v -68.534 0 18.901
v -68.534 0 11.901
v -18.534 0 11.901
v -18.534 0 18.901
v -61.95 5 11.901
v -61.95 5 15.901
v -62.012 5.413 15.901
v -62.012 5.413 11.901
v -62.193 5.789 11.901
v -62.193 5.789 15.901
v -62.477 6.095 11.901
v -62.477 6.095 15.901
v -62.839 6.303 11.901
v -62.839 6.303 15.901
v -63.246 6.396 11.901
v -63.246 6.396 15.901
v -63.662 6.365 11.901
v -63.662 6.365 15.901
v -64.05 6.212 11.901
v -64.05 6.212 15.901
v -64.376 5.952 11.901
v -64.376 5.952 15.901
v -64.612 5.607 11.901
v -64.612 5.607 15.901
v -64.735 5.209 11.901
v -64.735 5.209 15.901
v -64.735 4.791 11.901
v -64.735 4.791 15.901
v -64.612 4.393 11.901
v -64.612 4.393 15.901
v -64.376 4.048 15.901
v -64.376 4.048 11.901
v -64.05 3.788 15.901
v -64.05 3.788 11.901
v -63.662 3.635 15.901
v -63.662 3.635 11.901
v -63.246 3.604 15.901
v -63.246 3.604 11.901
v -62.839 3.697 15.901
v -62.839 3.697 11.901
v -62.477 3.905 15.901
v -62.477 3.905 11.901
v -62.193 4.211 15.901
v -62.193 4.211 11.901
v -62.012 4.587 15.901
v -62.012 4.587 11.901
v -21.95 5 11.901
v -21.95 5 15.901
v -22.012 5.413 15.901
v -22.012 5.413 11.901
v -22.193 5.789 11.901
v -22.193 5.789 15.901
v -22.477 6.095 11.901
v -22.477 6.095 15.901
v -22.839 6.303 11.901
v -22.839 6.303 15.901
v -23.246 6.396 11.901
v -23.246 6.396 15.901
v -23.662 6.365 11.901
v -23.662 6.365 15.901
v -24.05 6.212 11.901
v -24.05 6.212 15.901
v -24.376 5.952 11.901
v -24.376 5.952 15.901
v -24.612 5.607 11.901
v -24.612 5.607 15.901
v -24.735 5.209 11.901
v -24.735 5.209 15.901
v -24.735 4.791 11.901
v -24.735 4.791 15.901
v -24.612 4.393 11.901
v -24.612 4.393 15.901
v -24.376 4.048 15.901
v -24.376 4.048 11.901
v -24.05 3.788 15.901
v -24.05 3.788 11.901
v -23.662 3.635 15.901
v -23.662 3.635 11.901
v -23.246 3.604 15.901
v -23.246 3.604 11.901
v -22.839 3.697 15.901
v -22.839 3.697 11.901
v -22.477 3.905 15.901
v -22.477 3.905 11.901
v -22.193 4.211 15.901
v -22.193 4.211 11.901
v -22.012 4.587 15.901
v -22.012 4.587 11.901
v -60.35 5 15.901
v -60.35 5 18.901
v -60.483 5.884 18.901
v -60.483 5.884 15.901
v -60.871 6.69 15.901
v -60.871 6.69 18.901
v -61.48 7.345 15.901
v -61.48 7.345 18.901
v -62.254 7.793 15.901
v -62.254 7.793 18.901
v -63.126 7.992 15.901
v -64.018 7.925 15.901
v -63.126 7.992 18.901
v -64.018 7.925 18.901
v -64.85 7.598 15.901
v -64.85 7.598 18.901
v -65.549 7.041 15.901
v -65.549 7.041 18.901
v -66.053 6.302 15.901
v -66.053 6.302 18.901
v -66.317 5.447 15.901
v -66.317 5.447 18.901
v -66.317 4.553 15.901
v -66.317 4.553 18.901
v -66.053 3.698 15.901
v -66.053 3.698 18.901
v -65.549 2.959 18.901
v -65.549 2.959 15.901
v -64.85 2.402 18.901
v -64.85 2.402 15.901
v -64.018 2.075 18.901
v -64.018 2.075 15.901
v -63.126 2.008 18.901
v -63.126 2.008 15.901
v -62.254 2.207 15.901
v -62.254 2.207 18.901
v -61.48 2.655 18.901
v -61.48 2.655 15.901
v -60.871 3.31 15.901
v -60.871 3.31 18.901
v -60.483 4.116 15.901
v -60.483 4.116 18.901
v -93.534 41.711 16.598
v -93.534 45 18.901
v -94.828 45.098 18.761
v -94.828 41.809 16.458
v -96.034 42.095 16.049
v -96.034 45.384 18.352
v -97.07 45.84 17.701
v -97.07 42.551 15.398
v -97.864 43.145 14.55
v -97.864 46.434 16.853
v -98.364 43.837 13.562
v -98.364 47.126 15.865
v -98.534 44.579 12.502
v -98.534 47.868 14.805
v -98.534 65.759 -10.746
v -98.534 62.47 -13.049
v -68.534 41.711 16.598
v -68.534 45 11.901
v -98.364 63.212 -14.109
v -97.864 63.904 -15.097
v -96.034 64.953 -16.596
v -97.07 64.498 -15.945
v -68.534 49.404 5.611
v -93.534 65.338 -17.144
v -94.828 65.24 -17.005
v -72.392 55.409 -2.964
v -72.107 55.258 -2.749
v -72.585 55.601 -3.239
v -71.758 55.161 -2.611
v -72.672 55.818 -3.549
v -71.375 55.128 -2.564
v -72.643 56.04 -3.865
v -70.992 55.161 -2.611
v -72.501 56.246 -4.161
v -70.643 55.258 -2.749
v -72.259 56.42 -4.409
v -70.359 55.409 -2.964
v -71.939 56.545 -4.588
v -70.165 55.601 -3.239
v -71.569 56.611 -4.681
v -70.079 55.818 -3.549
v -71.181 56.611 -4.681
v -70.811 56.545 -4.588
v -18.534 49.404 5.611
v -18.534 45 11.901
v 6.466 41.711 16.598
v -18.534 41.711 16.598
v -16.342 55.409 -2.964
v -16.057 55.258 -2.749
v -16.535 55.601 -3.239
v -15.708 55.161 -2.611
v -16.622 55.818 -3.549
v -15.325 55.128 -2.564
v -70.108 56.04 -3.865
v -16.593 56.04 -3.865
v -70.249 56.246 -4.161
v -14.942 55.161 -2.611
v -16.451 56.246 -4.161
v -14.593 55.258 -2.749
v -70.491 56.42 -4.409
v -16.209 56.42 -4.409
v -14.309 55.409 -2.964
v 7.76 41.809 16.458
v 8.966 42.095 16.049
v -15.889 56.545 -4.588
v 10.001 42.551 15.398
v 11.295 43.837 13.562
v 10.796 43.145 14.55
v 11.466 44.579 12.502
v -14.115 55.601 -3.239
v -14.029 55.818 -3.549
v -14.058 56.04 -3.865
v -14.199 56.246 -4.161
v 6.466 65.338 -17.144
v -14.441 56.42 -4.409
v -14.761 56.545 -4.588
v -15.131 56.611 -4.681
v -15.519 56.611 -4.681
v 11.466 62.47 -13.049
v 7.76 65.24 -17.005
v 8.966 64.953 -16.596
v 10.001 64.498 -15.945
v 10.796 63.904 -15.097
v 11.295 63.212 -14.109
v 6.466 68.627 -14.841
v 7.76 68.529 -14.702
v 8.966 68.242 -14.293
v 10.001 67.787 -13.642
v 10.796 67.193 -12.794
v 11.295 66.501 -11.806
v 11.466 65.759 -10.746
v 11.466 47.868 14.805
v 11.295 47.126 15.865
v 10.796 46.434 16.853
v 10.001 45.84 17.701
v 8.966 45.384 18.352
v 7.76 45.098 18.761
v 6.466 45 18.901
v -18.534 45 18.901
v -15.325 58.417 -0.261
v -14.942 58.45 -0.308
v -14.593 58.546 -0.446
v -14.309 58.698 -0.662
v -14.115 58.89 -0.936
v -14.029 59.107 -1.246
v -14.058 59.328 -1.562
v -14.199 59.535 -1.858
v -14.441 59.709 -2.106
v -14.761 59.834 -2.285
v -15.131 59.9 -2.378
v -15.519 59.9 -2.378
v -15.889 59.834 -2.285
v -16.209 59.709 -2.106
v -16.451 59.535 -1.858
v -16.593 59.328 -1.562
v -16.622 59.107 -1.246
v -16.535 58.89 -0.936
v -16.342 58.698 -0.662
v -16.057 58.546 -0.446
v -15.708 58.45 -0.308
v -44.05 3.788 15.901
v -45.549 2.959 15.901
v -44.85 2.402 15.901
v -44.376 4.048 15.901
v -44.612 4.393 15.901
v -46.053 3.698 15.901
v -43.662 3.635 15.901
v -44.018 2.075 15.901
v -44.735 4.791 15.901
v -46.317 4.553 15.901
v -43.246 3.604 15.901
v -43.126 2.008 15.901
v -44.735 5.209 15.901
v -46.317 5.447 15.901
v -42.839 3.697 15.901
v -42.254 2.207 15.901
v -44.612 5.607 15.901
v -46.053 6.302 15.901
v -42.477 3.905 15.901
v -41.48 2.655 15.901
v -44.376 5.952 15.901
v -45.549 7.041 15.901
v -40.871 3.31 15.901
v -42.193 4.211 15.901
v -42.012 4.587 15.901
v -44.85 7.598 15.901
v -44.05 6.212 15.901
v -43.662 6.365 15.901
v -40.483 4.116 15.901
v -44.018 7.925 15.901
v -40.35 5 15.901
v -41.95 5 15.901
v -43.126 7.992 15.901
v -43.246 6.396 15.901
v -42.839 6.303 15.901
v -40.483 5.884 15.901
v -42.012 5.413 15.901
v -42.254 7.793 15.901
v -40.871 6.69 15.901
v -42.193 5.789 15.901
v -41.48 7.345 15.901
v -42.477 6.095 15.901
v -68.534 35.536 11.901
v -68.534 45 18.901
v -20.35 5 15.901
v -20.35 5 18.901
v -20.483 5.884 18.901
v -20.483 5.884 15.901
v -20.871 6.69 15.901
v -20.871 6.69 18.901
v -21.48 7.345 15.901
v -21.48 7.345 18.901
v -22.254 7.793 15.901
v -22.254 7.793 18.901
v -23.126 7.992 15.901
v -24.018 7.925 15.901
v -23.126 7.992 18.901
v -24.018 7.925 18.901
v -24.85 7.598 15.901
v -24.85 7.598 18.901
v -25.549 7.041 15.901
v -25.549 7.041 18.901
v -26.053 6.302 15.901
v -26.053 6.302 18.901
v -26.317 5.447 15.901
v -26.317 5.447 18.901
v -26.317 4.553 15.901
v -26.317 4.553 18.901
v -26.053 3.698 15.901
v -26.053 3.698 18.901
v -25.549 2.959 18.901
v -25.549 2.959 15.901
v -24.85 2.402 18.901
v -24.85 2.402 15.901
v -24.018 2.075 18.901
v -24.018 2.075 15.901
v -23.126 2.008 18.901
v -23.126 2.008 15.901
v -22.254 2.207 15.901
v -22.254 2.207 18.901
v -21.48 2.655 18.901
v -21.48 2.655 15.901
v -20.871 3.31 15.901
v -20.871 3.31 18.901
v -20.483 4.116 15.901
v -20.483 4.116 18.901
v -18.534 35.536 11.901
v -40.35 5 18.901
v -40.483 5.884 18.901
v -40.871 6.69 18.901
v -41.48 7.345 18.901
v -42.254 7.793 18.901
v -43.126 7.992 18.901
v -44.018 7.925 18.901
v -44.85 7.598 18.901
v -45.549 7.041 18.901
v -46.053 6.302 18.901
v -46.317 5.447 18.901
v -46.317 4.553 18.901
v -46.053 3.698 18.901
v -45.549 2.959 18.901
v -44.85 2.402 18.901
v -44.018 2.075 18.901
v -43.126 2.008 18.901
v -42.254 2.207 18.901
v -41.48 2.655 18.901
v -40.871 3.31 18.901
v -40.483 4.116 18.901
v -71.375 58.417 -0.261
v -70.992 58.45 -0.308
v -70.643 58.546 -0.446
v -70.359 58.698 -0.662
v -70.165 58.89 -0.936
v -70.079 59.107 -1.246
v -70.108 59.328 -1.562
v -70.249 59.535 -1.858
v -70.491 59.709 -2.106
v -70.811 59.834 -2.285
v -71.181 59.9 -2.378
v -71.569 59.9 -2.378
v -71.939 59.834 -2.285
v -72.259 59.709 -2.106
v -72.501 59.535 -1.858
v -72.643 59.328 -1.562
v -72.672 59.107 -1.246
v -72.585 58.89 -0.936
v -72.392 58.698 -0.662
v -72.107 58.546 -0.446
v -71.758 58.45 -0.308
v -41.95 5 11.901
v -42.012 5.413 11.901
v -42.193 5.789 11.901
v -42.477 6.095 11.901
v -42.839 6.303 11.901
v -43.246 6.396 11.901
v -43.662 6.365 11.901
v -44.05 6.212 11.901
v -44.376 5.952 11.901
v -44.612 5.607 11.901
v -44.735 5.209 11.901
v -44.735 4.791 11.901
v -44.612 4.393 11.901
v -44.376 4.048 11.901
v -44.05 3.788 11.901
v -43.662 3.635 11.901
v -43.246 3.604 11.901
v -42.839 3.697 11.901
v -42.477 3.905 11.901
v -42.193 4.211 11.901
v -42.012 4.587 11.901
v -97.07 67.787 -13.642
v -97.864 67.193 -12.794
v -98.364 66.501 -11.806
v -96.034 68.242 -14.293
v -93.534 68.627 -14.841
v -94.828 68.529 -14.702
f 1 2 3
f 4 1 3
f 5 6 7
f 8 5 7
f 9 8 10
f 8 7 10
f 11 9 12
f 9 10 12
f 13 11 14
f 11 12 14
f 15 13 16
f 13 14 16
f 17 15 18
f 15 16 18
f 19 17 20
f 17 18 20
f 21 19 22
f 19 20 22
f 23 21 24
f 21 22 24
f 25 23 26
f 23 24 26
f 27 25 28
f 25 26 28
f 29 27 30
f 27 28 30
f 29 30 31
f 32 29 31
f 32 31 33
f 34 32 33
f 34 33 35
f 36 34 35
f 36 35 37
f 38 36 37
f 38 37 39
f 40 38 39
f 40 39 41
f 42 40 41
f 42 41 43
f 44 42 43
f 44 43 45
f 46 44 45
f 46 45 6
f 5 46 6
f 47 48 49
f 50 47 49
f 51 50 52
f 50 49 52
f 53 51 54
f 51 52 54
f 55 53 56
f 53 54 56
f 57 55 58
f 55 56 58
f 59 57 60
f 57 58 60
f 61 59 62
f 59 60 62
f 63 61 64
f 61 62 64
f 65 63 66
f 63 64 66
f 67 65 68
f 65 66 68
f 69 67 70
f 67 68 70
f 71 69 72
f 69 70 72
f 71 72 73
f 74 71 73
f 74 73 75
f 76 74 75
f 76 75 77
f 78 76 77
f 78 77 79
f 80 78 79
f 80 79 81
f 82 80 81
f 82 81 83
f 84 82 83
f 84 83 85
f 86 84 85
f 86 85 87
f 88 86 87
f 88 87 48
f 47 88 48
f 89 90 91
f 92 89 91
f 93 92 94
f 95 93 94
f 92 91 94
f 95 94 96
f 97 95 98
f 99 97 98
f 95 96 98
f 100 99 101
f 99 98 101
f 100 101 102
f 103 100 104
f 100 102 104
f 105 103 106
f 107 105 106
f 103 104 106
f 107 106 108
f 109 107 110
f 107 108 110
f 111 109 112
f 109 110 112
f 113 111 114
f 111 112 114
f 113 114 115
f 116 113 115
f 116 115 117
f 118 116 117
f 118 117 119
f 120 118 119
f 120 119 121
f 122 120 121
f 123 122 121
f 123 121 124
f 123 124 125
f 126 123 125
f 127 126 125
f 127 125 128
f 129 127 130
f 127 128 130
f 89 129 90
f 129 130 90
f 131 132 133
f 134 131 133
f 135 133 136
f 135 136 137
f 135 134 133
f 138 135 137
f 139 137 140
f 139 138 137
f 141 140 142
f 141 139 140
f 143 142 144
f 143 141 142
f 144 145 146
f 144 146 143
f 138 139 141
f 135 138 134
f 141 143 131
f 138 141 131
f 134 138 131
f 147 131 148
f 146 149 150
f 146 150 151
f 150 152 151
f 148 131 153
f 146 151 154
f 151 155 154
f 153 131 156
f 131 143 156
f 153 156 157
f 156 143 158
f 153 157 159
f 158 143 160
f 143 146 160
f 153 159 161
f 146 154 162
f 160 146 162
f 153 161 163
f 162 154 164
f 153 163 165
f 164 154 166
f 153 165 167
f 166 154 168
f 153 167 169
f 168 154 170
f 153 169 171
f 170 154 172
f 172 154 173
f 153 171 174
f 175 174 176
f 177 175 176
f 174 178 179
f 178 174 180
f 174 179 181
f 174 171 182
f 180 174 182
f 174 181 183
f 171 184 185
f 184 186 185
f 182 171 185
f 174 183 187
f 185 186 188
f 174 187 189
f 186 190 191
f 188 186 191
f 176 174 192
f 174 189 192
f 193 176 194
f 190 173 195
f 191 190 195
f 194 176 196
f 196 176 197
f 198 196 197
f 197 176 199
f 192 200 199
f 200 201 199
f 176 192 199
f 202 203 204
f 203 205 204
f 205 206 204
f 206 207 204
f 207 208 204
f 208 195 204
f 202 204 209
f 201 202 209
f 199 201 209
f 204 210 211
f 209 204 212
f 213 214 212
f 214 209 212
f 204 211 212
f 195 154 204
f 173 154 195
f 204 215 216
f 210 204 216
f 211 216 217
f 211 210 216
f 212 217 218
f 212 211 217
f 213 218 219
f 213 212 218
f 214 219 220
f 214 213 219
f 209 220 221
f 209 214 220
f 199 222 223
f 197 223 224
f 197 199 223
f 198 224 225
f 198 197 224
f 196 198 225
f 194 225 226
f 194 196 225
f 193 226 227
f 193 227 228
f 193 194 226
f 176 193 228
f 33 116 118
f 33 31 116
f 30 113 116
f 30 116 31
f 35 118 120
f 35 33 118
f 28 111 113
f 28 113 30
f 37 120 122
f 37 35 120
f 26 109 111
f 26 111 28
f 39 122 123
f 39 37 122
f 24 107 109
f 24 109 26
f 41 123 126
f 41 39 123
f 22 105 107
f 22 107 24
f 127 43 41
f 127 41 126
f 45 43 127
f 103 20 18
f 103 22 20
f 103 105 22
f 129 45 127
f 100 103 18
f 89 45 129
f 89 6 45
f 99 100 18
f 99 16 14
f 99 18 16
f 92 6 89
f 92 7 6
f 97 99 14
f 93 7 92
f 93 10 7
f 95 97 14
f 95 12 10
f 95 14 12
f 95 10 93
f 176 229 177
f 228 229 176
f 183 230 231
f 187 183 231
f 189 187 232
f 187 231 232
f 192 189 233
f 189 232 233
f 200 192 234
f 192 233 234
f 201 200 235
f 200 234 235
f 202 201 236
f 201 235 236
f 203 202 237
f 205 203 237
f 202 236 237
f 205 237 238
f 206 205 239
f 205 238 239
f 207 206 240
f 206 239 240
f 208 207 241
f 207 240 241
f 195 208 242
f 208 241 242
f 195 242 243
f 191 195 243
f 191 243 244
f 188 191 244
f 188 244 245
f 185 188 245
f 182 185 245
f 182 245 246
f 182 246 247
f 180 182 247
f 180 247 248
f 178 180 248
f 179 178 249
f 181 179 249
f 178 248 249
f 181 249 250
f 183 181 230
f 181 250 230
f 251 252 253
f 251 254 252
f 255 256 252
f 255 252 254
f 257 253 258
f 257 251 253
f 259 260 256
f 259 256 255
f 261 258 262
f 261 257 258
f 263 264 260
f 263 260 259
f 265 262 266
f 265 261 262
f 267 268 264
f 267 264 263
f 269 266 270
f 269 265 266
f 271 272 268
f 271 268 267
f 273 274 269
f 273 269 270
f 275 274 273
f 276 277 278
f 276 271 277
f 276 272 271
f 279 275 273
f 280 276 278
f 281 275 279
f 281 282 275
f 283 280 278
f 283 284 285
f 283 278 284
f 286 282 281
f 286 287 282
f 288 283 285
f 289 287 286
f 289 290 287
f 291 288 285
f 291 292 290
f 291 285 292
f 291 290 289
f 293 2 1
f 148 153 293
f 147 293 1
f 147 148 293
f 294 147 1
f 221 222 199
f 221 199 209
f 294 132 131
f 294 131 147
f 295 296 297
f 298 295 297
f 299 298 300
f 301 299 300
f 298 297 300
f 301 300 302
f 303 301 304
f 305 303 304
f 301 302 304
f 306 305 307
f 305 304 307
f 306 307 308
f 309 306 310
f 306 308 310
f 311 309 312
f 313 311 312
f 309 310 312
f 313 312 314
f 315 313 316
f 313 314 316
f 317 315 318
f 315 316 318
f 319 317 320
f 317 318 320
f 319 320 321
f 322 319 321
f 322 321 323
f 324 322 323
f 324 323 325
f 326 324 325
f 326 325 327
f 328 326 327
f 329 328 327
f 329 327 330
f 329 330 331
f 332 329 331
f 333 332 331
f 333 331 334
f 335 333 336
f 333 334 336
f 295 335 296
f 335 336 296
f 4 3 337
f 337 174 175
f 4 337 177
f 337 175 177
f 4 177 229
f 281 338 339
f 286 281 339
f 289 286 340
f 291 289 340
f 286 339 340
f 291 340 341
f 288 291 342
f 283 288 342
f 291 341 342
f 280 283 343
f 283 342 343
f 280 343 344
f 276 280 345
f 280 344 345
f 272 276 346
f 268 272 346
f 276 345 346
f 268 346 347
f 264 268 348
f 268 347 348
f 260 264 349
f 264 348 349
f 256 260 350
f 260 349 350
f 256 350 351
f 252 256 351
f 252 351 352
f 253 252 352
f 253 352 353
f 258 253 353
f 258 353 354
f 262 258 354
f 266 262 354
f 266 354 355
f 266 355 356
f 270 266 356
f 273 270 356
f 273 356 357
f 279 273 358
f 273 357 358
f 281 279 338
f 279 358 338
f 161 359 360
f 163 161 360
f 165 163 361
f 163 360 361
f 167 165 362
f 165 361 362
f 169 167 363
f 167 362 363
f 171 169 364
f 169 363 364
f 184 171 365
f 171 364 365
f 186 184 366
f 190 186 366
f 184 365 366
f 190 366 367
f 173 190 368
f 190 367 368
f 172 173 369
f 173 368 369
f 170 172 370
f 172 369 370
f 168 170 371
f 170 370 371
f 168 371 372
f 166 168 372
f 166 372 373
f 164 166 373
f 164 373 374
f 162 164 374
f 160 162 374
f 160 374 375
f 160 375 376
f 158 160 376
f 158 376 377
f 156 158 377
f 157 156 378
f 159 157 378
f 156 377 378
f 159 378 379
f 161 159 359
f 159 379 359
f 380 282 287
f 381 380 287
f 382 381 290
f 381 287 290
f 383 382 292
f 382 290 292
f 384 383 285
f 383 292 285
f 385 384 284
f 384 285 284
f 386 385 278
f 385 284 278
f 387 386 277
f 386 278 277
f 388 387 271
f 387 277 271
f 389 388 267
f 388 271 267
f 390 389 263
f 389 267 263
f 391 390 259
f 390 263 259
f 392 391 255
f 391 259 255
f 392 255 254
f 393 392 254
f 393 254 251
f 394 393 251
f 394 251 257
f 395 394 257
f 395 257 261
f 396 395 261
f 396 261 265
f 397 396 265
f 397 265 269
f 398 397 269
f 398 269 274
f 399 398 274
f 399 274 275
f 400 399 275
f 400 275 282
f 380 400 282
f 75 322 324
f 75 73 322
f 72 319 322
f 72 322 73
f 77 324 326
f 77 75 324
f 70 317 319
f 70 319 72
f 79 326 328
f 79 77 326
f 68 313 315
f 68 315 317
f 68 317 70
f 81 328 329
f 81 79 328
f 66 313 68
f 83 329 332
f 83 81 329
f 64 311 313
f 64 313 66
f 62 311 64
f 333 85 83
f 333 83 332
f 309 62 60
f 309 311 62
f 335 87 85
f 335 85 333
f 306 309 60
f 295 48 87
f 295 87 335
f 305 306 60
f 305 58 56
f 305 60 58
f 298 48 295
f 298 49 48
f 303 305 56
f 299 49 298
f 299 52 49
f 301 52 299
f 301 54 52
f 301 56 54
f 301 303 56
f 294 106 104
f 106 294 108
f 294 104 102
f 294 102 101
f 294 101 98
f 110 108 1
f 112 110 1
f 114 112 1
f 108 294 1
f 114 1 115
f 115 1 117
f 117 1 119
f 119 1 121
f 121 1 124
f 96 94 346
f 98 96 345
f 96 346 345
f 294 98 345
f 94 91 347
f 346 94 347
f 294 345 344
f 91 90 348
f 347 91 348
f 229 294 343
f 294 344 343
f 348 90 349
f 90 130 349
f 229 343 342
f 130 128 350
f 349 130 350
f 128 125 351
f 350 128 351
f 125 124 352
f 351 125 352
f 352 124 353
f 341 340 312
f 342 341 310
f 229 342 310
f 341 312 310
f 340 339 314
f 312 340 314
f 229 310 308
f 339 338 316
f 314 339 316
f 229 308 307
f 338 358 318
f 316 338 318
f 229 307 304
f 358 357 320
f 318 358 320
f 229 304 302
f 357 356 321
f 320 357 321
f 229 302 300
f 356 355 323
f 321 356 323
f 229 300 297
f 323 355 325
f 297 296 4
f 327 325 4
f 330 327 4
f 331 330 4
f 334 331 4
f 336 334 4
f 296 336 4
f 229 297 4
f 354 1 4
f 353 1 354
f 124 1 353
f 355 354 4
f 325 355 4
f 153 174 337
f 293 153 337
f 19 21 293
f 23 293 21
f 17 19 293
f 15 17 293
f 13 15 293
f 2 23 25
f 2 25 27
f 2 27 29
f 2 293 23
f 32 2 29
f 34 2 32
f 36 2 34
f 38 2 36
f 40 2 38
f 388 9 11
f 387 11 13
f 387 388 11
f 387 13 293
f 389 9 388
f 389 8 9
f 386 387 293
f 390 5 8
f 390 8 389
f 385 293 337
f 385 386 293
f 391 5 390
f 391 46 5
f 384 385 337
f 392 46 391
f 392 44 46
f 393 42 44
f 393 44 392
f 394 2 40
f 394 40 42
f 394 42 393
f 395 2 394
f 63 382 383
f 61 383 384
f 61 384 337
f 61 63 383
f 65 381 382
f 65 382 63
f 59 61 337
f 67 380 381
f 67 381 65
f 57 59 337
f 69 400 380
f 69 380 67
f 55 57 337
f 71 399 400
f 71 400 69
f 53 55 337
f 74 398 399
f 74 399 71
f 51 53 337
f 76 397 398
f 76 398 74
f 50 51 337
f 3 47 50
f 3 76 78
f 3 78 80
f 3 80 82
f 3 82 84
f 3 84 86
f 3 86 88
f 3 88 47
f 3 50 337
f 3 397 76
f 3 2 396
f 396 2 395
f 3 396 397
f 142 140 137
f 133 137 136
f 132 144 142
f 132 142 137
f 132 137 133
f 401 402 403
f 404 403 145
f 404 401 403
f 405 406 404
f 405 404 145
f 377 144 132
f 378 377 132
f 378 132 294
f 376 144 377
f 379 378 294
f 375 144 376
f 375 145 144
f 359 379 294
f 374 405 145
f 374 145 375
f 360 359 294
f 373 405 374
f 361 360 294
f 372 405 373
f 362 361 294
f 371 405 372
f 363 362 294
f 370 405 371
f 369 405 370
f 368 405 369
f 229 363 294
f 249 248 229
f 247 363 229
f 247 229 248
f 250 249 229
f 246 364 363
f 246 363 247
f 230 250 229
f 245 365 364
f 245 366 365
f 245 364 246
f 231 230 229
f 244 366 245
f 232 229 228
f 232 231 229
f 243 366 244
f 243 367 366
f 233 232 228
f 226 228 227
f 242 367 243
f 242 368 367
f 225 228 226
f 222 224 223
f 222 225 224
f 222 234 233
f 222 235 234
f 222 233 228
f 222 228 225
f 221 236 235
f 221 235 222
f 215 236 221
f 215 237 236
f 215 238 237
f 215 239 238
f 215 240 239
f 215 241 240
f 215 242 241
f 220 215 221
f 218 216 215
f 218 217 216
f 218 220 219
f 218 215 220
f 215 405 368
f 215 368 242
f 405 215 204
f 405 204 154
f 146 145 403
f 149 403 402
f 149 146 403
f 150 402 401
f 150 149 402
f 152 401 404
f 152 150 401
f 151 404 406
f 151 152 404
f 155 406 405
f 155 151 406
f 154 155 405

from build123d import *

# Parameters (mm, degrees)
SKETCH_1_W          = 50
SKETCH_1_H          = 7
EXTRUDE_1_DEPTH     = 45
SKETCH_2_R          = 3
CUT_EXTRUDE_1_DEPTH = 3
SKETCH_3_R          = 1.4
CUT_EXTRUDE_2_DEPTH = 83.08499944
SKETCH_5_R          = 1.3
EXTRUDE_2_DEPTH     = 4.015035
EXTRUDE_3_DEPTH     = 50
FILLET_1_R          = 5


with BuildPart() as part:
    # 草图1 → 凸台-拉伸1 (new body)
    with BuildSketch(Plane(origin=(0, 0, 0), x_dir=(1, 0, 0), z_dir=(0, 1, 0))):
        with Locations((-43.534277066, -15.400769649)):
            Rectangle(SKETCH_1_W, SKETCH_1_H)
    extrude(amount=EXTRUDE_1_DEPTH)

    # 草图2 → 切除-拉伸1 (cut)
    with BuildSketch(Plane.XY.offset(18.900769649)):
        with Locations((-43.350176606, 5)):
            Circle(SKETCH_2_R)
        with Locations((-23.350176606, 5)):
            Circle(SKETCH_2_R)
        with Locations((-63.350176606, 5)):
            Circle(SKETCH_2_R)
    extrude(amount=-CUT_EXTRUDE_1_DEPTH, mode=Mode.SUBTRACT)

    # 草图3 → 切除-拉伸2 (cut, through all)
    with BuildSketch(Plane.XY.offset(15.900769649)):
        with Locations((-23.350176606, 5)):
            Circle(SKETCH_3_R)
        with Locations((-43.350176606, 5)):
            Circle(SKETCH_3_R)
        with Locations((-63.350176606, 5)):
            Circle(SKETCH_3_R)
    extrude(amount=-CUT_EXTRUDE_2_DEPTH, mode=Mode.SUBTRACT)

    # 草图5 → 凸台-拉伸2 (add)
    with BuildSketch(Plane(origin=(0, 39.075910108, 27.36124682), x_dir=(1, 0, 0), z_dir=(0, 0.819152044288991, 0.5735764363510473))):
        Polygon((-68.534277066, 10.328335539), (-18.534277066, 10.328335539), (11.465722934, 10.328335539), (11.465722934, 51.520032107), (-18.534277066, 51.520032107), (-68.534277066, 51.520032107), (-98.534277066, 51.520032107), (-98.534277066, 10.328335539), align=None)
        with Locations(Location((-71.375176606, 35.020032107, 0), (0, 0, 270))):
            Circle(SKETCH_5_R, mode=Mode.SUBTRACT)
        with Locations(Location((-15.325176606, 35.020032107, 0), (0, 0, 270))):
            Circle(SKETCH_5_R, mode=Mode.SUBTRACT)
    extrude(amount=-EXTRUDE_2_DEPTH)

    # 草图6 → 凸台-拉伸3 (add)
    with BuildSketch(Plane(origin=(-18.534277066, 0, 0), x_dir=(0, 0, -1), z_dir=(1, 0, 0))):
        Polygon((-11.900769649, 45), (-5.610910777, 49.404206597), (-11.900769649, 35.535742762), align=None)
    extrude(amount=-EXTRUDE_3_DEPTH)

    # 圆角1
    fillet_1_edges = [part.edges().sort_by_distance(p)[0] for p in [
        (11.465722934, 43.355537936, 17.749304916),
        (-98.534277066, 66.982124461, -15.992957536),
        (11.465722934, 66.982124461, -15.992957536),
        (-98.534277066, 43.355537936, 17.749304916),
    ]]
    fillet(fillet_1_edges, radius=FILLET_1_R)


solid = part.part
